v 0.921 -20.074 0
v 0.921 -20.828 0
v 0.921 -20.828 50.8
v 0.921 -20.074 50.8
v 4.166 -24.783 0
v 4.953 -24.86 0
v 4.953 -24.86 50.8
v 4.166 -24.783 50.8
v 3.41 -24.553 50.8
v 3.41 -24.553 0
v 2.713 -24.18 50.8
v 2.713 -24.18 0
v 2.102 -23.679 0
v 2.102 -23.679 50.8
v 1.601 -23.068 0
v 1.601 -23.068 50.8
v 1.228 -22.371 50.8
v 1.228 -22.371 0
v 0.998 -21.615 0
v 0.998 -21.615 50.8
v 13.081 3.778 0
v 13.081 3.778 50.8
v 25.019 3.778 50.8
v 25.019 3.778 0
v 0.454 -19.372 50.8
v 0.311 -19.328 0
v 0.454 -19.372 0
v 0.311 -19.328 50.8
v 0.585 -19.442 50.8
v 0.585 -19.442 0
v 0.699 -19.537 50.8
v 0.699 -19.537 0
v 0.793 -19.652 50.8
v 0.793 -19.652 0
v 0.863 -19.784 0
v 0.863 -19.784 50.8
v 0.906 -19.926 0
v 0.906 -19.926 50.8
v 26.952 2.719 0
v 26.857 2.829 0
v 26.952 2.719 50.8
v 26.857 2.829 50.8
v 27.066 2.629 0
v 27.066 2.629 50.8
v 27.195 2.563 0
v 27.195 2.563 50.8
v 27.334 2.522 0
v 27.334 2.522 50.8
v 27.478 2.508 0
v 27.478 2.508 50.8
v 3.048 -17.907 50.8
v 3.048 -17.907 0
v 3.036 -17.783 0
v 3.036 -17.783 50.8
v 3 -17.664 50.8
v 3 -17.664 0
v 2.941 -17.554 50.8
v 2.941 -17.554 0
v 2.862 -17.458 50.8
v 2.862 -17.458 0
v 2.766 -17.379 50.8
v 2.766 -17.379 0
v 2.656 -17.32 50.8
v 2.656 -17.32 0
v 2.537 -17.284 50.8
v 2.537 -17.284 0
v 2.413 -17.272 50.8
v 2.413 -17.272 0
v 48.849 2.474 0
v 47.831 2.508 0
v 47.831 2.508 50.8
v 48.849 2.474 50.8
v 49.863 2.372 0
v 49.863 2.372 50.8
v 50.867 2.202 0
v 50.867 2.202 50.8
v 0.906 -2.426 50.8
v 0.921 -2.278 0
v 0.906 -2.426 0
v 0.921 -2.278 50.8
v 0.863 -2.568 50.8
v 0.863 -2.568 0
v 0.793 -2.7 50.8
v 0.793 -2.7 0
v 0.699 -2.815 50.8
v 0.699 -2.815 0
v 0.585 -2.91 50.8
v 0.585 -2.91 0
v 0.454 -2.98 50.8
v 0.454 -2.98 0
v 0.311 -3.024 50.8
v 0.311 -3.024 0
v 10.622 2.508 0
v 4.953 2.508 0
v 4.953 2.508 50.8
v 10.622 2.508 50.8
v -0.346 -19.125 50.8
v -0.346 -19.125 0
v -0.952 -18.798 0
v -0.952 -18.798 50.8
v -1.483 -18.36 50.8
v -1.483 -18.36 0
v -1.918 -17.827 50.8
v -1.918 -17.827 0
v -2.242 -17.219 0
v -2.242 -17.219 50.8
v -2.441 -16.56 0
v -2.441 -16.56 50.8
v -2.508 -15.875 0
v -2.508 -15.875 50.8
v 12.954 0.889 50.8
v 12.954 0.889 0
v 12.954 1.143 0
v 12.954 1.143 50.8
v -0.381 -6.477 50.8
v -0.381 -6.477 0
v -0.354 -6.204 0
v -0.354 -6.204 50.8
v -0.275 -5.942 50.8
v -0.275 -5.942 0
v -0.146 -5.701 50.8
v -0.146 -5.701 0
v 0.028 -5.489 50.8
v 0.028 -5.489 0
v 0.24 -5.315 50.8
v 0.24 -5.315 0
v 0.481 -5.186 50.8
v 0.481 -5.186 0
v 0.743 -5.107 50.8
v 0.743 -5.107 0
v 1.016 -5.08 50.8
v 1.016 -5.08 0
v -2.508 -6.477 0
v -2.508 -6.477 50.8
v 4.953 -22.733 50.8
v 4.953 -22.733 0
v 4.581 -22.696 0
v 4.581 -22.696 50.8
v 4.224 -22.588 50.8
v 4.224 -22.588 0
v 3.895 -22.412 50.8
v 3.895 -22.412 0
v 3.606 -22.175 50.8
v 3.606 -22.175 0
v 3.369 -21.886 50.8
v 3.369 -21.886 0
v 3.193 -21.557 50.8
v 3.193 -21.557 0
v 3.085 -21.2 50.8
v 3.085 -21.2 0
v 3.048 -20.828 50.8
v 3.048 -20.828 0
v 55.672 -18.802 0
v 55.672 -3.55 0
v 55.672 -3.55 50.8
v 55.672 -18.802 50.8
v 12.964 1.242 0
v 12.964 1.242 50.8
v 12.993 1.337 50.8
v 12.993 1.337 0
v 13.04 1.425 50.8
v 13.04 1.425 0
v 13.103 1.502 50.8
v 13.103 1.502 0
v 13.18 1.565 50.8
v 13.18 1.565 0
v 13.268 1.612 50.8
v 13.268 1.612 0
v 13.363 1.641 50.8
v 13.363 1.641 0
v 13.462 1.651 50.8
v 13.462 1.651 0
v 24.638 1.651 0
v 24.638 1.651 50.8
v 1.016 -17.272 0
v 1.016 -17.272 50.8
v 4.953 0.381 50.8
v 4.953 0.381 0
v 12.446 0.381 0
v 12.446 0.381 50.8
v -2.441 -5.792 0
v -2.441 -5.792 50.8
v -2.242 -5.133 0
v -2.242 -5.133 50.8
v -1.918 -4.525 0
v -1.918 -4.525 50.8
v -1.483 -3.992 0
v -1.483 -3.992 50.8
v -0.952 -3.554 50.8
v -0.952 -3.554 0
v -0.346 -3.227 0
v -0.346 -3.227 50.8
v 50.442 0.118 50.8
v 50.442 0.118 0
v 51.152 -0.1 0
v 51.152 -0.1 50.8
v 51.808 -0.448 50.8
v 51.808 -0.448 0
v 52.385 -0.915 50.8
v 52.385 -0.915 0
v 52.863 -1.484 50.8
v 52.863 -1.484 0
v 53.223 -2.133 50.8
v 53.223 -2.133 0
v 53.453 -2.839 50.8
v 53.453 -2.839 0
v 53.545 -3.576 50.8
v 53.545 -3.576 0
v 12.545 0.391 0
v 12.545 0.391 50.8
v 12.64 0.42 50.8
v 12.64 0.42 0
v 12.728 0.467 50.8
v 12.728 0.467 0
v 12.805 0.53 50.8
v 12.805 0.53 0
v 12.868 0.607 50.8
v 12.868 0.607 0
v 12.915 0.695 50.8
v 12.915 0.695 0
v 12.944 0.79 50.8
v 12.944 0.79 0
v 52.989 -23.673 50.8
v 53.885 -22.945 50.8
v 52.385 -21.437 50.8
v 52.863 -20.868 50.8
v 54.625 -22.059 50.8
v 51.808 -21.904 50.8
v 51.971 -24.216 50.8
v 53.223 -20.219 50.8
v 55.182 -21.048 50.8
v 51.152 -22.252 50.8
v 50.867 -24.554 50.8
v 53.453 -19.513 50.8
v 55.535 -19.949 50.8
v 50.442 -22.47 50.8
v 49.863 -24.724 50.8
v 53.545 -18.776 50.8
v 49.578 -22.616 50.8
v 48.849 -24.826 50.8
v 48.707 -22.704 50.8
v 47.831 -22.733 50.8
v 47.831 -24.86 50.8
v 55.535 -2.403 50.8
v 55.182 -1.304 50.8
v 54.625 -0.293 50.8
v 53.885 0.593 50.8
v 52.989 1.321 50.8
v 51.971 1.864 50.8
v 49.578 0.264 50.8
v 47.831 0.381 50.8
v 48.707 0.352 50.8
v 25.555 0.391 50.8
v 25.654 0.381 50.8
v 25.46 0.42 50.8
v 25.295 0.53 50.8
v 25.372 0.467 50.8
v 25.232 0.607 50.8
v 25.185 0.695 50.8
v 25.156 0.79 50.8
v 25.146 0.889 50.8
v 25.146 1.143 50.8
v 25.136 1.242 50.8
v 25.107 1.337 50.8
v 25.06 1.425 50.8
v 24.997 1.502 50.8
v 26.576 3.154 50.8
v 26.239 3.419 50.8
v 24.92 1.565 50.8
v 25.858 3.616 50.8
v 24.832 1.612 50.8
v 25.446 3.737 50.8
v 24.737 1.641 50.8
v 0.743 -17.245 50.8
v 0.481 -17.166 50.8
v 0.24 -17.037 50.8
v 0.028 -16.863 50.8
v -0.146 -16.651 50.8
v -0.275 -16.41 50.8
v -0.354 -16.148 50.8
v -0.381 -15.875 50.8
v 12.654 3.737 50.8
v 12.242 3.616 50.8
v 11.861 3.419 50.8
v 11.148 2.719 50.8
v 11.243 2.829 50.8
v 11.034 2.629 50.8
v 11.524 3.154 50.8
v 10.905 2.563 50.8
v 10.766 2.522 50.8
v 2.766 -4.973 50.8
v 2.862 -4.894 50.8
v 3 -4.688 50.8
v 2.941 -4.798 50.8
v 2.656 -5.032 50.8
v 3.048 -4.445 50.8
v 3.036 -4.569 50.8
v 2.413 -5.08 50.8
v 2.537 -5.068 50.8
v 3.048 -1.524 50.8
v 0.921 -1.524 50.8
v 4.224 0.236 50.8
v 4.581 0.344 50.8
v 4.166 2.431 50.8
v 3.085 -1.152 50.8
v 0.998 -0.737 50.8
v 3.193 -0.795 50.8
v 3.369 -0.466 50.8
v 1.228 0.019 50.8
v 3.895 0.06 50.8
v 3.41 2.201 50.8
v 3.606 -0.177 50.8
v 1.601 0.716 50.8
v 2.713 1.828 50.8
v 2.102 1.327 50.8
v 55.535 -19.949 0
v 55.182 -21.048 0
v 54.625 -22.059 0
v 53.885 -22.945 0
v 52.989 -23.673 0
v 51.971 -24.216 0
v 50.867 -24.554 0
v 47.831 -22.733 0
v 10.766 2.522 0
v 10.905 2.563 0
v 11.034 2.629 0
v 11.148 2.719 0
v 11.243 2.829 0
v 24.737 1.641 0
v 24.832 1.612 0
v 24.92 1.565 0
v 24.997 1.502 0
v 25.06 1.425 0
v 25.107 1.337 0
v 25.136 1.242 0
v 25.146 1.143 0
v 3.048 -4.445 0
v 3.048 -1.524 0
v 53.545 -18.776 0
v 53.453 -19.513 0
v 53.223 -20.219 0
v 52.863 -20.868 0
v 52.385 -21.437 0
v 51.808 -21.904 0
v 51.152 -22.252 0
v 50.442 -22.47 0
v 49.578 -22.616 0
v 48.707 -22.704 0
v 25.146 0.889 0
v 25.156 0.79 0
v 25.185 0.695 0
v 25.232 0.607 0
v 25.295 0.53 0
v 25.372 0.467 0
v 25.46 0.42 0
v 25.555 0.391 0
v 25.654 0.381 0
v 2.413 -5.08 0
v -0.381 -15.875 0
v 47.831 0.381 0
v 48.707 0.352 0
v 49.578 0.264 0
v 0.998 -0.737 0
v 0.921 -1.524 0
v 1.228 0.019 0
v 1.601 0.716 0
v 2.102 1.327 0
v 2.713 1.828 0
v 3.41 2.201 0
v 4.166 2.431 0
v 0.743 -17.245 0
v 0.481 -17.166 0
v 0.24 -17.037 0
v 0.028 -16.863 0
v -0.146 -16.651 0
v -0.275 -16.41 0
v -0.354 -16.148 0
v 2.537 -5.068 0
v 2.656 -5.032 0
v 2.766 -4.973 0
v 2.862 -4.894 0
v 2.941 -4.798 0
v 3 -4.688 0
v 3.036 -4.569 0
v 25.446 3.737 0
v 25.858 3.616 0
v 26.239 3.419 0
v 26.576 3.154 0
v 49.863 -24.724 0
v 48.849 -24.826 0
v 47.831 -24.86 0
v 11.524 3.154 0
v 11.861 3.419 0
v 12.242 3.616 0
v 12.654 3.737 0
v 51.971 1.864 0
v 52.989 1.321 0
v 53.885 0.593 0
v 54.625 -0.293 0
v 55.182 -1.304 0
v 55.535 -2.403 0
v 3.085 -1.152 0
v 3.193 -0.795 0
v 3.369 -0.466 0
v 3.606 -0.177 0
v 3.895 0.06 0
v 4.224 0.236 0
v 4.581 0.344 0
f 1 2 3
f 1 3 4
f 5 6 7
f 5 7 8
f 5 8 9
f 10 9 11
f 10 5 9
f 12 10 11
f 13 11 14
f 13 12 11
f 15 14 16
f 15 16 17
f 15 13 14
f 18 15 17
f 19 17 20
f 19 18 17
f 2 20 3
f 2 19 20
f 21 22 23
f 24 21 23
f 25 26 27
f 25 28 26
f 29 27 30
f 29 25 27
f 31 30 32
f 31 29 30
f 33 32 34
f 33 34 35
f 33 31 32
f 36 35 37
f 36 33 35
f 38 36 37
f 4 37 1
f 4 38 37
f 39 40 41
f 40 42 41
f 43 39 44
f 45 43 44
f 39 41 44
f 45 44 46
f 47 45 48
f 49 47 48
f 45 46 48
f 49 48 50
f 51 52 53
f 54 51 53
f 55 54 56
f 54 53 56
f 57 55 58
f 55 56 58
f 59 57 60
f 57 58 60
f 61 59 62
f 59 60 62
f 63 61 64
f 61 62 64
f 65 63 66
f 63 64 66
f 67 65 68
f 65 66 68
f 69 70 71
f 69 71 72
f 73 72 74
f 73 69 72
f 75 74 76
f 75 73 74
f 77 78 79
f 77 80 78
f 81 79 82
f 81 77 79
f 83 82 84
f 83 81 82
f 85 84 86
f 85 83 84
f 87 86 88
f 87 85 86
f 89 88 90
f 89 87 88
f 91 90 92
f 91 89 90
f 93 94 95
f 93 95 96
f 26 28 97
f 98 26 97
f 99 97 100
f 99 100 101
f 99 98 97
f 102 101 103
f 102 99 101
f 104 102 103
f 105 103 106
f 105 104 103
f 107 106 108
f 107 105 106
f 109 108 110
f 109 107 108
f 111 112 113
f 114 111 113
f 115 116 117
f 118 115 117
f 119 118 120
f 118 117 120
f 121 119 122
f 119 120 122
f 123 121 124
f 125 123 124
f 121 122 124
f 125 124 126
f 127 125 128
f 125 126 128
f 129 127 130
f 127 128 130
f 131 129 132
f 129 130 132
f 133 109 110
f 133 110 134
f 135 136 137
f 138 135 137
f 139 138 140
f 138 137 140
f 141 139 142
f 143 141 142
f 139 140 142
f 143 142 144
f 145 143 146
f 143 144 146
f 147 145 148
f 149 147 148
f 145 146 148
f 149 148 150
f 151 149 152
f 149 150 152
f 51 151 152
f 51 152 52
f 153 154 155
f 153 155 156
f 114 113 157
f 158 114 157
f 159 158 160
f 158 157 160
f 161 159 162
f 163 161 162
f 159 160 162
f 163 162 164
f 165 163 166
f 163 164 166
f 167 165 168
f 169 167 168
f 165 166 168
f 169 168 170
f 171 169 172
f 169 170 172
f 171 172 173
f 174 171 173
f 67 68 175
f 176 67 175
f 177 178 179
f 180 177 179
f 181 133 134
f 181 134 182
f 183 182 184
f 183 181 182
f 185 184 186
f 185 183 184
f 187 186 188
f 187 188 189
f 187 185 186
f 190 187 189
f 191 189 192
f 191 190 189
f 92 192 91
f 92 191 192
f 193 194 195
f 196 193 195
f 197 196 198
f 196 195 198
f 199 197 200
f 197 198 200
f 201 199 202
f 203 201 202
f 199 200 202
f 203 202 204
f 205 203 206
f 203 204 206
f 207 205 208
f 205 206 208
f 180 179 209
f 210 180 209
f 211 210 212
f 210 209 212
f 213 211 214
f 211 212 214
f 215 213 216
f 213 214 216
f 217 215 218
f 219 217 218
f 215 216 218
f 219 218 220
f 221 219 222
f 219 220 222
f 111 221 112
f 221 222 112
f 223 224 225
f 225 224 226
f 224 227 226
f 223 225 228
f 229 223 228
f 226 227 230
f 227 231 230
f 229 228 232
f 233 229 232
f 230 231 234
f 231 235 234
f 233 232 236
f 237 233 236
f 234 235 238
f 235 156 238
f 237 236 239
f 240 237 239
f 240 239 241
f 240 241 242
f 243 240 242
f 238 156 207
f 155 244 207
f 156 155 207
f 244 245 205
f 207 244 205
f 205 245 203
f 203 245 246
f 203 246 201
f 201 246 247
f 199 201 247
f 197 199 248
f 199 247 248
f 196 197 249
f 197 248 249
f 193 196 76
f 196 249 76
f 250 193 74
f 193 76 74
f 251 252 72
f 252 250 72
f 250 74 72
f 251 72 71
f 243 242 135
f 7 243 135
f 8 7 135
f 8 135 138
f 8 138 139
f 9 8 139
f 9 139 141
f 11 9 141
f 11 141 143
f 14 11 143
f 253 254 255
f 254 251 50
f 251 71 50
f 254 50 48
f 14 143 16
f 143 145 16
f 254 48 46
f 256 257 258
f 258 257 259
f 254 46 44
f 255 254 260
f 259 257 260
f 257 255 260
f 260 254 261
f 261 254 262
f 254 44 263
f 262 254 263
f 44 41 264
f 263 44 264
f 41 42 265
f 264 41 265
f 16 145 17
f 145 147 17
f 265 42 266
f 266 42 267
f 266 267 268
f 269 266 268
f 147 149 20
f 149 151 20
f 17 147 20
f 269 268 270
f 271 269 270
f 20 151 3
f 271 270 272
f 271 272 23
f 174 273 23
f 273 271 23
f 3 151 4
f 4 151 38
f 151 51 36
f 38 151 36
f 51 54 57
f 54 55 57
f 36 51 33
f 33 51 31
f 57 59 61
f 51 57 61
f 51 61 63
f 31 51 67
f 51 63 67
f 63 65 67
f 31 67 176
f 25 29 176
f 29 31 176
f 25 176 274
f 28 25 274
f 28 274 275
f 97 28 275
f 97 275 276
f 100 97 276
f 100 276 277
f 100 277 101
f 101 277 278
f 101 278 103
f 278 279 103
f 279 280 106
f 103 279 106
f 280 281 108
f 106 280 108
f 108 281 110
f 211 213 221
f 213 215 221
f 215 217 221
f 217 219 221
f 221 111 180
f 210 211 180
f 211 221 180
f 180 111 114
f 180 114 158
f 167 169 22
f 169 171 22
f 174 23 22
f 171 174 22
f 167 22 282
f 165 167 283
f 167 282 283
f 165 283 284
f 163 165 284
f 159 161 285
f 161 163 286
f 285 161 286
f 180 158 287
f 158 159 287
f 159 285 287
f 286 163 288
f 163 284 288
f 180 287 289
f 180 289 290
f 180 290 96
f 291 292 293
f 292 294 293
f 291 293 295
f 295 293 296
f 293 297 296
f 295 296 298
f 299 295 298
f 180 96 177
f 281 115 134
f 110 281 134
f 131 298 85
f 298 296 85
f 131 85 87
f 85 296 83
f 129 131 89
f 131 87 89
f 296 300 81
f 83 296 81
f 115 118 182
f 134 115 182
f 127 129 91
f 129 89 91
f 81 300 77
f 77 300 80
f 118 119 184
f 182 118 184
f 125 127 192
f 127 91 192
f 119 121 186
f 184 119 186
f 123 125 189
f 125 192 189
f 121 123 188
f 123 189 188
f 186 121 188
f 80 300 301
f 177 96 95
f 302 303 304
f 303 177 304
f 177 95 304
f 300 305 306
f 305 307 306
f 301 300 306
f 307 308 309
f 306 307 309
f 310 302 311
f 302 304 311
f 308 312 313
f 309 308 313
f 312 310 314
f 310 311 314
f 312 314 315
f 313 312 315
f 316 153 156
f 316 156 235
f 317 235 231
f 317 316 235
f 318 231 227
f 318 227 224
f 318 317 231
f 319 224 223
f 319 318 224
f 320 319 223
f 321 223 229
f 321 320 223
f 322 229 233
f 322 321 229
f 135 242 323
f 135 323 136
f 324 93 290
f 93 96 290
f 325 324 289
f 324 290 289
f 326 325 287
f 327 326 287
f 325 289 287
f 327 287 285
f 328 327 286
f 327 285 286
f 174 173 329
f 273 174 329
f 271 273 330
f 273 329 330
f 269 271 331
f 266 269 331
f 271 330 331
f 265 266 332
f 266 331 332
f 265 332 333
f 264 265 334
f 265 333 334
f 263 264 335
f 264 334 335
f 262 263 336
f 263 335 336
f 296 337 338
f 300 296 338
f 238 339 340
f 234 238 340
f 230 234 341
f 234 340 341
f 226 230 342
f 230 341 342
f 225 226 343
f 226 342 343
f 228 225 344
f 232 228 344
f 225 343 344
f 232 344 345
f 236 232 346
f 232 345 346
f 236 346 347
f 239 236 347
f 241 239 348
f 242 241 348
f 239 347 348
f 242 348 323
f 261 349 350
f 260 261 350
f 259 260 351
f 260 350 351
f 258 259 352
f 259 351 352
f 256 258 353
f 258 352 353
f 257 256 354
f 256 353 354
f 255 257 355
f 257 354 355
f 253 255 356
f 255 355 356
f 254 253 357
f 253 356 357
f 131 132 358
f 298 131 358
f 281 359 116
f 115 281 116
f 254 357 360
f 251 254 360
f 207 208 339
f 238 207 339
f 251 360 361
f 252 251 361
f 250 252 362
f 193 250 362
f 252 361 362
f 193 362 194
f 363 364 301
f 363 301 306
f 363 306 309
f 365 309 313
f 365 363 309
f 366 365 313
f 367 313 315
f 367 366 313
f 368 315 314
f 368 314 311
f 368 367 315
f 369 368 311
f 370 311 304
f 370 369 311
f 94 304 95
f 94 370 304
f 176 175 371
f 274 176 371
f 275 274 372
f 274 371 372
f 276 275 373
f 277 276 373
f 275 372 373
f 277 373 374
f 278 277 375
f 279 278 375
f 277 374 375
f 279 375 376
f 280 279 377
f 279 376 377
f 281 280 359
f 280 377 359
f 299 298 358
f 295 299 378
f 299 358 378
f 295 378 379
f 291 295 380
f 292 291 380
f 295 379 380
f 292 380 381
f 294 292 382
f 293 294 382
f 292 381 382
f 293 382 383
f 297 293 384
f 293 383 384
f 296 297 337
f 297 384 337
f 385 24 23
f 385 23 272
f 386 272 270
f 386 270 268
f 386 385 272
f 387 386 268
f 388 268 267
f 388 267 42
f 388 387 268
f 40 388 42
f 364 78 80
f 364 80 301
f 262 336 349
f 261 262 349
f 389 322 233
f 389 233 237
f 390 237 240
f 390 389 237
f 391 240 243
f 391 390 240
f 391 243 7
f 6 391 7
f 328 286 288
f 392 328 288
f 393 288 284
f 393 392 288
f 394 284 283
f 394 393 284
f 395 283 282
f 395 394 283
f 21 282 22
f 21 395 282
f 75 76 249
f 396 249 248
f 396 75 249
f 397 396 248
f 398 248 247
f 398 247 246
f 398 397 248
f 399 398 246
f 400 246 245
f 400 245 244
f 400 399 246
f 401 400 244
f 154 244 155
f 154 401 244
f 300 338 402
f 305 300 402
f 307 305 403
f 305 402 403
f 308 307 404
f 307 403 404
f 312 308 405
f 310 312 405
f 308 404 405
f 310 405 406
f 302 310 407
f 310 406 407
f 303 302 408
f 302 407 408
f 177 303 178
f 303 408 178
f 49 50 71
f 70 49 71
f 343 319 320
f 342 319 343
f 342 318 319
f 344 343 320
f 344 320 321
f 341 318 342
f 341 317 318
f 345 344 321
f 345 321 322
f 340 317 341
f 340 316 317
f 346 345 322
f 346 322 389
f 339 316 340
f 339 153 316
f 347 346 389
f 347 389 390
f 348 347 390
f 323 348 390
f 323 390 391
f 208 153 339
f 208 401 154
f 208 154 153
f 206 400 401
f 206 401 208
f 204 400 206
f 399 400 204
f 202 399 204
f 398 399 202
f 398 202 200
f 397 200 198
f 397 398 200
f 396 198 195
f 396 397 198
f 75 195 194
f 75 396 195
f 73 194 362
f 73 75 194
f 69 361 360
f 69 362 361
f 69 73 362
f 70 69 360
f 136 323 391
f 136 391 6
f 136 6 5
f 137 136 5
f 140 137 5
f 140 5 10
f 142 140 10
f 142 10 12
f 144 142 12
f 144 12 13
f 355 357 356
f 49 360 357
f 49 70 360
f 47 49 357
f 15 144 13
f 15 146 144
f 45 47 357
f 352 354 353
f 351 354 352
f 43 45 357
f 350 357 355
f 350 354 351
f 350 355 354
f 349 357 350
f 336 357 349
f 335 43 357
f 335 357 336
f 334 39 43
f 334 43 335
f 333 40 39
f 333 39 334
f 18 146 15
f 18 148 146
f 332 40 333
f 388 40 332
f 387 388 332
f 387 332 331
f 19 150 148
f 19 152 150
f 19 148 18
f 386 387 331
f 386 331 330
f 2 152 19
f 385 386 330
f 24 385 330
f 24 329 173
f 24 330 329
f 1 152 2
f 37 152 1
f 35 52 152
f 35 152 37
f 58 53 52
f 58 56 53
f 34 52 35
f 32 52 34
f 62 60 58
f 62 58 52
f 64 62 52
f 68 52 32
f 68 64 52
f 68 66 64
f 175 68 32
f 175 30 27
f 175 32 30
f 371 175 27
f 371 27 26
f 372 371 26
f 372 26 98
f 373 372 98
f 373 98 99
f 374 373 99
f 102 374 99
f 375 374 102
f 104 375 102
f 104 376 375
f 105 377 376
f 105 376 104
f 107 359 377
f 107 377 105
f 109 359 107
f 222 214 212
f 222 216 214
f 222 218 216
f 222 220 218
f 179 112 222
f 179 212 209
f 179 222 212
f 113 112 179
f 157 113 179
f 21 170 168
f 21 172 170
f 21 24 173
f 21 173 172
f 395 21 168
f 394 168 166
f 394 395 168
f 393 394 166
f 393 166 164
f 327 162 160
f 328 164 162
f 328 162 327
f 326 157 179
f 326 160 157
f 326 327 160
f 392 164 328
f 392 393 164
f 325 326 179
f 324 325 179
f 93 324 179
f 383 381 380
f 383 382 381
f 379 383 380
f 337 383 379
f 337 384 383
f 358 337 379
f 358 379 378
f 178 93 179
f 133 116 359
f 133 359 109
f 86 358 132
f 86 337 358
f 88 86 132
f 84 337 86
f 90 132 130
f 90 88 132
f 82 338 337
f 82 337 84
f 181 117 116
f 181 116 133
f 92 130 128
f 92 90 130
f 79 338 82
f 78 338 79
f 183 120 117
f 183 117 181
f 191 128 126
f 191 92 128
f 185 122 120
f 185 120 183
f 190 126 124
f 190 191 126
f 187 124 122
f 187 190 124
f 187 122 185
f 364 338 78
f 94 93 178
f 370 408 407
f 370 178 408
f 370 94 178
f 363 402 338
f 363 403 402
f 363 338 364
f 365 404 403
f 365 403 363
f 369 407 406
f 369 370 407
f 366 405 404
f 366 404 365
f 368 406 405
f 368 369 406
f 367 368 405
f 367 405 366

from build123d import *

# Parameters (mm, degrees)
BOSS_EXTRUDE1_DEPTH = 50.8
FILLET1_R           = 0.762


with BuildPart() as part:
    # Sketch1 → Boss-Extrude1 (new body)
    with BuildSketch(Plane.XY):
        with BuildLine():
            Line((0.921, -2.954280738), (0.921, -1.524))
            ThreePointArc((0.921, -1.524), (2.101945458, 1.327054542), (4.953, 2.508))
            Line((4.953, 2.508), (11.053129195, 2.508))
            ThreePointArc((11.053129195, 2.508), (11.884634671, 3.434294742), (13.081, 3.778))
            Line((13.081, 3.778), (25.019, 3.778))
            ThreePointArc((25.019, 3.778), (26.215365329, 3.434294742), (27.046870805, 2.508))
            Line((27.046870805, 2.508), (47.830933704, 2.508))
            ThreePointArc((47.830933704, 2.508), (49.356721017, 2.431266869), (50.867111376, 2.201841804))
            ThreePointArc((50.867111376, 2.201841804), (54.276645107, 0.167640195), (55.671506067, -3.549517234))
            Line((55.671506067, -3.549517234), (55.671506067, -18.802482766))
            ThreePointArc((55.671506067, -18.802482766), (54.276645107, -22.519640195), (50.867111376, -24.553841804))
            ThreePointArc((50.867111376, -24.553841804), (49.356721017, -24.783266869), (47.830933704, -24.86))
            Line((47.830933704, -24.86), (4.953, -24.86))
            ThreePointArc((4.953, -24.86), (2.101945458, -23.679054542), (0.921, -20.828))
            Line((0.921, -20.828), (0.921, -19.397719262))
            ThreePointArc((0.921, -19.397719262), (-1.509208506, -18.333027258), (-2.508, -15.875))
            Line((-2.508, -15.875), (-2.508, -6.477))
            ThreePointArc((-2.508, -6.477), (-1.509208506, -4.018972742), (0.921, -2.954280738))
        make_face()
        with BuildLine():
            Line((12.954, 0.889), (12.954, 1.143))
            ThreePointArc((12.954, 1.143), (13.102789755, 1.502210245), (13.462, 1.651))
            Line((13.462, 1.651), (24.638, 1.651))
            ThreePointArc((24.638, 1.651), (24.997210245, 1.502210245), (25.146, 1.143))
            Line((25.146, 1.143), (25.146, 0.889))
            ThreePointArc((25.146, 0.889), (25.294789755, 0.529789755), (25.654, 0.381))
            Line((25.654, 0.381), (47.830933704, 0.381))
            ThreePointArc((47.830933704, 0.381), (49.143323488, 0.314998811), (50.442469746, 0.117661273))
            ThreePointArc((50.442469746, 0.117661273), (52.637548133, -1.187962697), (53.544506067, -3.575524294))
            Line((53.544506067, -3.575524294), (53.544506067, -18.776475706))
            ThreePointArc((53.544506067, -18.776475706), (52.637548133, -21.164037303), (50.442469746, -22.469661273))
            ThreePointArc((50.442469746, -22.469661273), (49.143323488, -22.666998811), (47.830933704, -22.733))
            Line((47.830933704, -22.733), (4.953, -22.733))
            ThreePointArc((4.953, -22.733), (3.605961582, -22.175038418), (3.048, -20.828))
            Line((3.048, -20.828), (3.048, -17.907))
            ThreePointArc((3.048, -17.907), (2.862012806, -17.457987194), (2.413, -17.272))
            Line((2.413, -17.272), (1.016, -17.272))
            ThreePointArc((1.016, -17.272), (0.028171827, -16.862828173), (-0.381, -15.875))
            Line((-0.381, -15.875), (-0.381, -6.477))
            ThreePointArc((-0.381, -6.477), (0.028171827, -5.489171827), (1.016, -5.08))
            Line((1.016, -5.08), (2.413, -5.08))
            ThreePointArc((2.413, -5.08), (2.862012806, -4.894012806), (3.048, -4.445))
            Line((3.048, -4.445), (3.048, -1.524))
            ThreePointArc((3.048, -1.524), (3.605961582, -0.176961582), (4.953, 0.381))
            Line((4.953, 0.381), (12.446, 0.381))
            ThreePointArc((12.446, 0.381), (12.805210245, 0.529789755), (12.954, 0.889))
        make_face(mode=Mode.SUBTRACT)
    extrude(amount=BOSS_EXTRUDE1_DEPTH)

    # Fillet1
    fillet1_edges = [part.edges().sort_by_distance(p)[0] for p in [
        (0.921, -2.954280738, 25.4),
        (0.921, -19.397719262, 25.4),
        (27.046870805, 2.508, 25.4),
        (11.053129195, 2.508, 25.4),
    ]]
    fillet(fillet1_edges, radius=FILLET1_R)


solid = part.part
